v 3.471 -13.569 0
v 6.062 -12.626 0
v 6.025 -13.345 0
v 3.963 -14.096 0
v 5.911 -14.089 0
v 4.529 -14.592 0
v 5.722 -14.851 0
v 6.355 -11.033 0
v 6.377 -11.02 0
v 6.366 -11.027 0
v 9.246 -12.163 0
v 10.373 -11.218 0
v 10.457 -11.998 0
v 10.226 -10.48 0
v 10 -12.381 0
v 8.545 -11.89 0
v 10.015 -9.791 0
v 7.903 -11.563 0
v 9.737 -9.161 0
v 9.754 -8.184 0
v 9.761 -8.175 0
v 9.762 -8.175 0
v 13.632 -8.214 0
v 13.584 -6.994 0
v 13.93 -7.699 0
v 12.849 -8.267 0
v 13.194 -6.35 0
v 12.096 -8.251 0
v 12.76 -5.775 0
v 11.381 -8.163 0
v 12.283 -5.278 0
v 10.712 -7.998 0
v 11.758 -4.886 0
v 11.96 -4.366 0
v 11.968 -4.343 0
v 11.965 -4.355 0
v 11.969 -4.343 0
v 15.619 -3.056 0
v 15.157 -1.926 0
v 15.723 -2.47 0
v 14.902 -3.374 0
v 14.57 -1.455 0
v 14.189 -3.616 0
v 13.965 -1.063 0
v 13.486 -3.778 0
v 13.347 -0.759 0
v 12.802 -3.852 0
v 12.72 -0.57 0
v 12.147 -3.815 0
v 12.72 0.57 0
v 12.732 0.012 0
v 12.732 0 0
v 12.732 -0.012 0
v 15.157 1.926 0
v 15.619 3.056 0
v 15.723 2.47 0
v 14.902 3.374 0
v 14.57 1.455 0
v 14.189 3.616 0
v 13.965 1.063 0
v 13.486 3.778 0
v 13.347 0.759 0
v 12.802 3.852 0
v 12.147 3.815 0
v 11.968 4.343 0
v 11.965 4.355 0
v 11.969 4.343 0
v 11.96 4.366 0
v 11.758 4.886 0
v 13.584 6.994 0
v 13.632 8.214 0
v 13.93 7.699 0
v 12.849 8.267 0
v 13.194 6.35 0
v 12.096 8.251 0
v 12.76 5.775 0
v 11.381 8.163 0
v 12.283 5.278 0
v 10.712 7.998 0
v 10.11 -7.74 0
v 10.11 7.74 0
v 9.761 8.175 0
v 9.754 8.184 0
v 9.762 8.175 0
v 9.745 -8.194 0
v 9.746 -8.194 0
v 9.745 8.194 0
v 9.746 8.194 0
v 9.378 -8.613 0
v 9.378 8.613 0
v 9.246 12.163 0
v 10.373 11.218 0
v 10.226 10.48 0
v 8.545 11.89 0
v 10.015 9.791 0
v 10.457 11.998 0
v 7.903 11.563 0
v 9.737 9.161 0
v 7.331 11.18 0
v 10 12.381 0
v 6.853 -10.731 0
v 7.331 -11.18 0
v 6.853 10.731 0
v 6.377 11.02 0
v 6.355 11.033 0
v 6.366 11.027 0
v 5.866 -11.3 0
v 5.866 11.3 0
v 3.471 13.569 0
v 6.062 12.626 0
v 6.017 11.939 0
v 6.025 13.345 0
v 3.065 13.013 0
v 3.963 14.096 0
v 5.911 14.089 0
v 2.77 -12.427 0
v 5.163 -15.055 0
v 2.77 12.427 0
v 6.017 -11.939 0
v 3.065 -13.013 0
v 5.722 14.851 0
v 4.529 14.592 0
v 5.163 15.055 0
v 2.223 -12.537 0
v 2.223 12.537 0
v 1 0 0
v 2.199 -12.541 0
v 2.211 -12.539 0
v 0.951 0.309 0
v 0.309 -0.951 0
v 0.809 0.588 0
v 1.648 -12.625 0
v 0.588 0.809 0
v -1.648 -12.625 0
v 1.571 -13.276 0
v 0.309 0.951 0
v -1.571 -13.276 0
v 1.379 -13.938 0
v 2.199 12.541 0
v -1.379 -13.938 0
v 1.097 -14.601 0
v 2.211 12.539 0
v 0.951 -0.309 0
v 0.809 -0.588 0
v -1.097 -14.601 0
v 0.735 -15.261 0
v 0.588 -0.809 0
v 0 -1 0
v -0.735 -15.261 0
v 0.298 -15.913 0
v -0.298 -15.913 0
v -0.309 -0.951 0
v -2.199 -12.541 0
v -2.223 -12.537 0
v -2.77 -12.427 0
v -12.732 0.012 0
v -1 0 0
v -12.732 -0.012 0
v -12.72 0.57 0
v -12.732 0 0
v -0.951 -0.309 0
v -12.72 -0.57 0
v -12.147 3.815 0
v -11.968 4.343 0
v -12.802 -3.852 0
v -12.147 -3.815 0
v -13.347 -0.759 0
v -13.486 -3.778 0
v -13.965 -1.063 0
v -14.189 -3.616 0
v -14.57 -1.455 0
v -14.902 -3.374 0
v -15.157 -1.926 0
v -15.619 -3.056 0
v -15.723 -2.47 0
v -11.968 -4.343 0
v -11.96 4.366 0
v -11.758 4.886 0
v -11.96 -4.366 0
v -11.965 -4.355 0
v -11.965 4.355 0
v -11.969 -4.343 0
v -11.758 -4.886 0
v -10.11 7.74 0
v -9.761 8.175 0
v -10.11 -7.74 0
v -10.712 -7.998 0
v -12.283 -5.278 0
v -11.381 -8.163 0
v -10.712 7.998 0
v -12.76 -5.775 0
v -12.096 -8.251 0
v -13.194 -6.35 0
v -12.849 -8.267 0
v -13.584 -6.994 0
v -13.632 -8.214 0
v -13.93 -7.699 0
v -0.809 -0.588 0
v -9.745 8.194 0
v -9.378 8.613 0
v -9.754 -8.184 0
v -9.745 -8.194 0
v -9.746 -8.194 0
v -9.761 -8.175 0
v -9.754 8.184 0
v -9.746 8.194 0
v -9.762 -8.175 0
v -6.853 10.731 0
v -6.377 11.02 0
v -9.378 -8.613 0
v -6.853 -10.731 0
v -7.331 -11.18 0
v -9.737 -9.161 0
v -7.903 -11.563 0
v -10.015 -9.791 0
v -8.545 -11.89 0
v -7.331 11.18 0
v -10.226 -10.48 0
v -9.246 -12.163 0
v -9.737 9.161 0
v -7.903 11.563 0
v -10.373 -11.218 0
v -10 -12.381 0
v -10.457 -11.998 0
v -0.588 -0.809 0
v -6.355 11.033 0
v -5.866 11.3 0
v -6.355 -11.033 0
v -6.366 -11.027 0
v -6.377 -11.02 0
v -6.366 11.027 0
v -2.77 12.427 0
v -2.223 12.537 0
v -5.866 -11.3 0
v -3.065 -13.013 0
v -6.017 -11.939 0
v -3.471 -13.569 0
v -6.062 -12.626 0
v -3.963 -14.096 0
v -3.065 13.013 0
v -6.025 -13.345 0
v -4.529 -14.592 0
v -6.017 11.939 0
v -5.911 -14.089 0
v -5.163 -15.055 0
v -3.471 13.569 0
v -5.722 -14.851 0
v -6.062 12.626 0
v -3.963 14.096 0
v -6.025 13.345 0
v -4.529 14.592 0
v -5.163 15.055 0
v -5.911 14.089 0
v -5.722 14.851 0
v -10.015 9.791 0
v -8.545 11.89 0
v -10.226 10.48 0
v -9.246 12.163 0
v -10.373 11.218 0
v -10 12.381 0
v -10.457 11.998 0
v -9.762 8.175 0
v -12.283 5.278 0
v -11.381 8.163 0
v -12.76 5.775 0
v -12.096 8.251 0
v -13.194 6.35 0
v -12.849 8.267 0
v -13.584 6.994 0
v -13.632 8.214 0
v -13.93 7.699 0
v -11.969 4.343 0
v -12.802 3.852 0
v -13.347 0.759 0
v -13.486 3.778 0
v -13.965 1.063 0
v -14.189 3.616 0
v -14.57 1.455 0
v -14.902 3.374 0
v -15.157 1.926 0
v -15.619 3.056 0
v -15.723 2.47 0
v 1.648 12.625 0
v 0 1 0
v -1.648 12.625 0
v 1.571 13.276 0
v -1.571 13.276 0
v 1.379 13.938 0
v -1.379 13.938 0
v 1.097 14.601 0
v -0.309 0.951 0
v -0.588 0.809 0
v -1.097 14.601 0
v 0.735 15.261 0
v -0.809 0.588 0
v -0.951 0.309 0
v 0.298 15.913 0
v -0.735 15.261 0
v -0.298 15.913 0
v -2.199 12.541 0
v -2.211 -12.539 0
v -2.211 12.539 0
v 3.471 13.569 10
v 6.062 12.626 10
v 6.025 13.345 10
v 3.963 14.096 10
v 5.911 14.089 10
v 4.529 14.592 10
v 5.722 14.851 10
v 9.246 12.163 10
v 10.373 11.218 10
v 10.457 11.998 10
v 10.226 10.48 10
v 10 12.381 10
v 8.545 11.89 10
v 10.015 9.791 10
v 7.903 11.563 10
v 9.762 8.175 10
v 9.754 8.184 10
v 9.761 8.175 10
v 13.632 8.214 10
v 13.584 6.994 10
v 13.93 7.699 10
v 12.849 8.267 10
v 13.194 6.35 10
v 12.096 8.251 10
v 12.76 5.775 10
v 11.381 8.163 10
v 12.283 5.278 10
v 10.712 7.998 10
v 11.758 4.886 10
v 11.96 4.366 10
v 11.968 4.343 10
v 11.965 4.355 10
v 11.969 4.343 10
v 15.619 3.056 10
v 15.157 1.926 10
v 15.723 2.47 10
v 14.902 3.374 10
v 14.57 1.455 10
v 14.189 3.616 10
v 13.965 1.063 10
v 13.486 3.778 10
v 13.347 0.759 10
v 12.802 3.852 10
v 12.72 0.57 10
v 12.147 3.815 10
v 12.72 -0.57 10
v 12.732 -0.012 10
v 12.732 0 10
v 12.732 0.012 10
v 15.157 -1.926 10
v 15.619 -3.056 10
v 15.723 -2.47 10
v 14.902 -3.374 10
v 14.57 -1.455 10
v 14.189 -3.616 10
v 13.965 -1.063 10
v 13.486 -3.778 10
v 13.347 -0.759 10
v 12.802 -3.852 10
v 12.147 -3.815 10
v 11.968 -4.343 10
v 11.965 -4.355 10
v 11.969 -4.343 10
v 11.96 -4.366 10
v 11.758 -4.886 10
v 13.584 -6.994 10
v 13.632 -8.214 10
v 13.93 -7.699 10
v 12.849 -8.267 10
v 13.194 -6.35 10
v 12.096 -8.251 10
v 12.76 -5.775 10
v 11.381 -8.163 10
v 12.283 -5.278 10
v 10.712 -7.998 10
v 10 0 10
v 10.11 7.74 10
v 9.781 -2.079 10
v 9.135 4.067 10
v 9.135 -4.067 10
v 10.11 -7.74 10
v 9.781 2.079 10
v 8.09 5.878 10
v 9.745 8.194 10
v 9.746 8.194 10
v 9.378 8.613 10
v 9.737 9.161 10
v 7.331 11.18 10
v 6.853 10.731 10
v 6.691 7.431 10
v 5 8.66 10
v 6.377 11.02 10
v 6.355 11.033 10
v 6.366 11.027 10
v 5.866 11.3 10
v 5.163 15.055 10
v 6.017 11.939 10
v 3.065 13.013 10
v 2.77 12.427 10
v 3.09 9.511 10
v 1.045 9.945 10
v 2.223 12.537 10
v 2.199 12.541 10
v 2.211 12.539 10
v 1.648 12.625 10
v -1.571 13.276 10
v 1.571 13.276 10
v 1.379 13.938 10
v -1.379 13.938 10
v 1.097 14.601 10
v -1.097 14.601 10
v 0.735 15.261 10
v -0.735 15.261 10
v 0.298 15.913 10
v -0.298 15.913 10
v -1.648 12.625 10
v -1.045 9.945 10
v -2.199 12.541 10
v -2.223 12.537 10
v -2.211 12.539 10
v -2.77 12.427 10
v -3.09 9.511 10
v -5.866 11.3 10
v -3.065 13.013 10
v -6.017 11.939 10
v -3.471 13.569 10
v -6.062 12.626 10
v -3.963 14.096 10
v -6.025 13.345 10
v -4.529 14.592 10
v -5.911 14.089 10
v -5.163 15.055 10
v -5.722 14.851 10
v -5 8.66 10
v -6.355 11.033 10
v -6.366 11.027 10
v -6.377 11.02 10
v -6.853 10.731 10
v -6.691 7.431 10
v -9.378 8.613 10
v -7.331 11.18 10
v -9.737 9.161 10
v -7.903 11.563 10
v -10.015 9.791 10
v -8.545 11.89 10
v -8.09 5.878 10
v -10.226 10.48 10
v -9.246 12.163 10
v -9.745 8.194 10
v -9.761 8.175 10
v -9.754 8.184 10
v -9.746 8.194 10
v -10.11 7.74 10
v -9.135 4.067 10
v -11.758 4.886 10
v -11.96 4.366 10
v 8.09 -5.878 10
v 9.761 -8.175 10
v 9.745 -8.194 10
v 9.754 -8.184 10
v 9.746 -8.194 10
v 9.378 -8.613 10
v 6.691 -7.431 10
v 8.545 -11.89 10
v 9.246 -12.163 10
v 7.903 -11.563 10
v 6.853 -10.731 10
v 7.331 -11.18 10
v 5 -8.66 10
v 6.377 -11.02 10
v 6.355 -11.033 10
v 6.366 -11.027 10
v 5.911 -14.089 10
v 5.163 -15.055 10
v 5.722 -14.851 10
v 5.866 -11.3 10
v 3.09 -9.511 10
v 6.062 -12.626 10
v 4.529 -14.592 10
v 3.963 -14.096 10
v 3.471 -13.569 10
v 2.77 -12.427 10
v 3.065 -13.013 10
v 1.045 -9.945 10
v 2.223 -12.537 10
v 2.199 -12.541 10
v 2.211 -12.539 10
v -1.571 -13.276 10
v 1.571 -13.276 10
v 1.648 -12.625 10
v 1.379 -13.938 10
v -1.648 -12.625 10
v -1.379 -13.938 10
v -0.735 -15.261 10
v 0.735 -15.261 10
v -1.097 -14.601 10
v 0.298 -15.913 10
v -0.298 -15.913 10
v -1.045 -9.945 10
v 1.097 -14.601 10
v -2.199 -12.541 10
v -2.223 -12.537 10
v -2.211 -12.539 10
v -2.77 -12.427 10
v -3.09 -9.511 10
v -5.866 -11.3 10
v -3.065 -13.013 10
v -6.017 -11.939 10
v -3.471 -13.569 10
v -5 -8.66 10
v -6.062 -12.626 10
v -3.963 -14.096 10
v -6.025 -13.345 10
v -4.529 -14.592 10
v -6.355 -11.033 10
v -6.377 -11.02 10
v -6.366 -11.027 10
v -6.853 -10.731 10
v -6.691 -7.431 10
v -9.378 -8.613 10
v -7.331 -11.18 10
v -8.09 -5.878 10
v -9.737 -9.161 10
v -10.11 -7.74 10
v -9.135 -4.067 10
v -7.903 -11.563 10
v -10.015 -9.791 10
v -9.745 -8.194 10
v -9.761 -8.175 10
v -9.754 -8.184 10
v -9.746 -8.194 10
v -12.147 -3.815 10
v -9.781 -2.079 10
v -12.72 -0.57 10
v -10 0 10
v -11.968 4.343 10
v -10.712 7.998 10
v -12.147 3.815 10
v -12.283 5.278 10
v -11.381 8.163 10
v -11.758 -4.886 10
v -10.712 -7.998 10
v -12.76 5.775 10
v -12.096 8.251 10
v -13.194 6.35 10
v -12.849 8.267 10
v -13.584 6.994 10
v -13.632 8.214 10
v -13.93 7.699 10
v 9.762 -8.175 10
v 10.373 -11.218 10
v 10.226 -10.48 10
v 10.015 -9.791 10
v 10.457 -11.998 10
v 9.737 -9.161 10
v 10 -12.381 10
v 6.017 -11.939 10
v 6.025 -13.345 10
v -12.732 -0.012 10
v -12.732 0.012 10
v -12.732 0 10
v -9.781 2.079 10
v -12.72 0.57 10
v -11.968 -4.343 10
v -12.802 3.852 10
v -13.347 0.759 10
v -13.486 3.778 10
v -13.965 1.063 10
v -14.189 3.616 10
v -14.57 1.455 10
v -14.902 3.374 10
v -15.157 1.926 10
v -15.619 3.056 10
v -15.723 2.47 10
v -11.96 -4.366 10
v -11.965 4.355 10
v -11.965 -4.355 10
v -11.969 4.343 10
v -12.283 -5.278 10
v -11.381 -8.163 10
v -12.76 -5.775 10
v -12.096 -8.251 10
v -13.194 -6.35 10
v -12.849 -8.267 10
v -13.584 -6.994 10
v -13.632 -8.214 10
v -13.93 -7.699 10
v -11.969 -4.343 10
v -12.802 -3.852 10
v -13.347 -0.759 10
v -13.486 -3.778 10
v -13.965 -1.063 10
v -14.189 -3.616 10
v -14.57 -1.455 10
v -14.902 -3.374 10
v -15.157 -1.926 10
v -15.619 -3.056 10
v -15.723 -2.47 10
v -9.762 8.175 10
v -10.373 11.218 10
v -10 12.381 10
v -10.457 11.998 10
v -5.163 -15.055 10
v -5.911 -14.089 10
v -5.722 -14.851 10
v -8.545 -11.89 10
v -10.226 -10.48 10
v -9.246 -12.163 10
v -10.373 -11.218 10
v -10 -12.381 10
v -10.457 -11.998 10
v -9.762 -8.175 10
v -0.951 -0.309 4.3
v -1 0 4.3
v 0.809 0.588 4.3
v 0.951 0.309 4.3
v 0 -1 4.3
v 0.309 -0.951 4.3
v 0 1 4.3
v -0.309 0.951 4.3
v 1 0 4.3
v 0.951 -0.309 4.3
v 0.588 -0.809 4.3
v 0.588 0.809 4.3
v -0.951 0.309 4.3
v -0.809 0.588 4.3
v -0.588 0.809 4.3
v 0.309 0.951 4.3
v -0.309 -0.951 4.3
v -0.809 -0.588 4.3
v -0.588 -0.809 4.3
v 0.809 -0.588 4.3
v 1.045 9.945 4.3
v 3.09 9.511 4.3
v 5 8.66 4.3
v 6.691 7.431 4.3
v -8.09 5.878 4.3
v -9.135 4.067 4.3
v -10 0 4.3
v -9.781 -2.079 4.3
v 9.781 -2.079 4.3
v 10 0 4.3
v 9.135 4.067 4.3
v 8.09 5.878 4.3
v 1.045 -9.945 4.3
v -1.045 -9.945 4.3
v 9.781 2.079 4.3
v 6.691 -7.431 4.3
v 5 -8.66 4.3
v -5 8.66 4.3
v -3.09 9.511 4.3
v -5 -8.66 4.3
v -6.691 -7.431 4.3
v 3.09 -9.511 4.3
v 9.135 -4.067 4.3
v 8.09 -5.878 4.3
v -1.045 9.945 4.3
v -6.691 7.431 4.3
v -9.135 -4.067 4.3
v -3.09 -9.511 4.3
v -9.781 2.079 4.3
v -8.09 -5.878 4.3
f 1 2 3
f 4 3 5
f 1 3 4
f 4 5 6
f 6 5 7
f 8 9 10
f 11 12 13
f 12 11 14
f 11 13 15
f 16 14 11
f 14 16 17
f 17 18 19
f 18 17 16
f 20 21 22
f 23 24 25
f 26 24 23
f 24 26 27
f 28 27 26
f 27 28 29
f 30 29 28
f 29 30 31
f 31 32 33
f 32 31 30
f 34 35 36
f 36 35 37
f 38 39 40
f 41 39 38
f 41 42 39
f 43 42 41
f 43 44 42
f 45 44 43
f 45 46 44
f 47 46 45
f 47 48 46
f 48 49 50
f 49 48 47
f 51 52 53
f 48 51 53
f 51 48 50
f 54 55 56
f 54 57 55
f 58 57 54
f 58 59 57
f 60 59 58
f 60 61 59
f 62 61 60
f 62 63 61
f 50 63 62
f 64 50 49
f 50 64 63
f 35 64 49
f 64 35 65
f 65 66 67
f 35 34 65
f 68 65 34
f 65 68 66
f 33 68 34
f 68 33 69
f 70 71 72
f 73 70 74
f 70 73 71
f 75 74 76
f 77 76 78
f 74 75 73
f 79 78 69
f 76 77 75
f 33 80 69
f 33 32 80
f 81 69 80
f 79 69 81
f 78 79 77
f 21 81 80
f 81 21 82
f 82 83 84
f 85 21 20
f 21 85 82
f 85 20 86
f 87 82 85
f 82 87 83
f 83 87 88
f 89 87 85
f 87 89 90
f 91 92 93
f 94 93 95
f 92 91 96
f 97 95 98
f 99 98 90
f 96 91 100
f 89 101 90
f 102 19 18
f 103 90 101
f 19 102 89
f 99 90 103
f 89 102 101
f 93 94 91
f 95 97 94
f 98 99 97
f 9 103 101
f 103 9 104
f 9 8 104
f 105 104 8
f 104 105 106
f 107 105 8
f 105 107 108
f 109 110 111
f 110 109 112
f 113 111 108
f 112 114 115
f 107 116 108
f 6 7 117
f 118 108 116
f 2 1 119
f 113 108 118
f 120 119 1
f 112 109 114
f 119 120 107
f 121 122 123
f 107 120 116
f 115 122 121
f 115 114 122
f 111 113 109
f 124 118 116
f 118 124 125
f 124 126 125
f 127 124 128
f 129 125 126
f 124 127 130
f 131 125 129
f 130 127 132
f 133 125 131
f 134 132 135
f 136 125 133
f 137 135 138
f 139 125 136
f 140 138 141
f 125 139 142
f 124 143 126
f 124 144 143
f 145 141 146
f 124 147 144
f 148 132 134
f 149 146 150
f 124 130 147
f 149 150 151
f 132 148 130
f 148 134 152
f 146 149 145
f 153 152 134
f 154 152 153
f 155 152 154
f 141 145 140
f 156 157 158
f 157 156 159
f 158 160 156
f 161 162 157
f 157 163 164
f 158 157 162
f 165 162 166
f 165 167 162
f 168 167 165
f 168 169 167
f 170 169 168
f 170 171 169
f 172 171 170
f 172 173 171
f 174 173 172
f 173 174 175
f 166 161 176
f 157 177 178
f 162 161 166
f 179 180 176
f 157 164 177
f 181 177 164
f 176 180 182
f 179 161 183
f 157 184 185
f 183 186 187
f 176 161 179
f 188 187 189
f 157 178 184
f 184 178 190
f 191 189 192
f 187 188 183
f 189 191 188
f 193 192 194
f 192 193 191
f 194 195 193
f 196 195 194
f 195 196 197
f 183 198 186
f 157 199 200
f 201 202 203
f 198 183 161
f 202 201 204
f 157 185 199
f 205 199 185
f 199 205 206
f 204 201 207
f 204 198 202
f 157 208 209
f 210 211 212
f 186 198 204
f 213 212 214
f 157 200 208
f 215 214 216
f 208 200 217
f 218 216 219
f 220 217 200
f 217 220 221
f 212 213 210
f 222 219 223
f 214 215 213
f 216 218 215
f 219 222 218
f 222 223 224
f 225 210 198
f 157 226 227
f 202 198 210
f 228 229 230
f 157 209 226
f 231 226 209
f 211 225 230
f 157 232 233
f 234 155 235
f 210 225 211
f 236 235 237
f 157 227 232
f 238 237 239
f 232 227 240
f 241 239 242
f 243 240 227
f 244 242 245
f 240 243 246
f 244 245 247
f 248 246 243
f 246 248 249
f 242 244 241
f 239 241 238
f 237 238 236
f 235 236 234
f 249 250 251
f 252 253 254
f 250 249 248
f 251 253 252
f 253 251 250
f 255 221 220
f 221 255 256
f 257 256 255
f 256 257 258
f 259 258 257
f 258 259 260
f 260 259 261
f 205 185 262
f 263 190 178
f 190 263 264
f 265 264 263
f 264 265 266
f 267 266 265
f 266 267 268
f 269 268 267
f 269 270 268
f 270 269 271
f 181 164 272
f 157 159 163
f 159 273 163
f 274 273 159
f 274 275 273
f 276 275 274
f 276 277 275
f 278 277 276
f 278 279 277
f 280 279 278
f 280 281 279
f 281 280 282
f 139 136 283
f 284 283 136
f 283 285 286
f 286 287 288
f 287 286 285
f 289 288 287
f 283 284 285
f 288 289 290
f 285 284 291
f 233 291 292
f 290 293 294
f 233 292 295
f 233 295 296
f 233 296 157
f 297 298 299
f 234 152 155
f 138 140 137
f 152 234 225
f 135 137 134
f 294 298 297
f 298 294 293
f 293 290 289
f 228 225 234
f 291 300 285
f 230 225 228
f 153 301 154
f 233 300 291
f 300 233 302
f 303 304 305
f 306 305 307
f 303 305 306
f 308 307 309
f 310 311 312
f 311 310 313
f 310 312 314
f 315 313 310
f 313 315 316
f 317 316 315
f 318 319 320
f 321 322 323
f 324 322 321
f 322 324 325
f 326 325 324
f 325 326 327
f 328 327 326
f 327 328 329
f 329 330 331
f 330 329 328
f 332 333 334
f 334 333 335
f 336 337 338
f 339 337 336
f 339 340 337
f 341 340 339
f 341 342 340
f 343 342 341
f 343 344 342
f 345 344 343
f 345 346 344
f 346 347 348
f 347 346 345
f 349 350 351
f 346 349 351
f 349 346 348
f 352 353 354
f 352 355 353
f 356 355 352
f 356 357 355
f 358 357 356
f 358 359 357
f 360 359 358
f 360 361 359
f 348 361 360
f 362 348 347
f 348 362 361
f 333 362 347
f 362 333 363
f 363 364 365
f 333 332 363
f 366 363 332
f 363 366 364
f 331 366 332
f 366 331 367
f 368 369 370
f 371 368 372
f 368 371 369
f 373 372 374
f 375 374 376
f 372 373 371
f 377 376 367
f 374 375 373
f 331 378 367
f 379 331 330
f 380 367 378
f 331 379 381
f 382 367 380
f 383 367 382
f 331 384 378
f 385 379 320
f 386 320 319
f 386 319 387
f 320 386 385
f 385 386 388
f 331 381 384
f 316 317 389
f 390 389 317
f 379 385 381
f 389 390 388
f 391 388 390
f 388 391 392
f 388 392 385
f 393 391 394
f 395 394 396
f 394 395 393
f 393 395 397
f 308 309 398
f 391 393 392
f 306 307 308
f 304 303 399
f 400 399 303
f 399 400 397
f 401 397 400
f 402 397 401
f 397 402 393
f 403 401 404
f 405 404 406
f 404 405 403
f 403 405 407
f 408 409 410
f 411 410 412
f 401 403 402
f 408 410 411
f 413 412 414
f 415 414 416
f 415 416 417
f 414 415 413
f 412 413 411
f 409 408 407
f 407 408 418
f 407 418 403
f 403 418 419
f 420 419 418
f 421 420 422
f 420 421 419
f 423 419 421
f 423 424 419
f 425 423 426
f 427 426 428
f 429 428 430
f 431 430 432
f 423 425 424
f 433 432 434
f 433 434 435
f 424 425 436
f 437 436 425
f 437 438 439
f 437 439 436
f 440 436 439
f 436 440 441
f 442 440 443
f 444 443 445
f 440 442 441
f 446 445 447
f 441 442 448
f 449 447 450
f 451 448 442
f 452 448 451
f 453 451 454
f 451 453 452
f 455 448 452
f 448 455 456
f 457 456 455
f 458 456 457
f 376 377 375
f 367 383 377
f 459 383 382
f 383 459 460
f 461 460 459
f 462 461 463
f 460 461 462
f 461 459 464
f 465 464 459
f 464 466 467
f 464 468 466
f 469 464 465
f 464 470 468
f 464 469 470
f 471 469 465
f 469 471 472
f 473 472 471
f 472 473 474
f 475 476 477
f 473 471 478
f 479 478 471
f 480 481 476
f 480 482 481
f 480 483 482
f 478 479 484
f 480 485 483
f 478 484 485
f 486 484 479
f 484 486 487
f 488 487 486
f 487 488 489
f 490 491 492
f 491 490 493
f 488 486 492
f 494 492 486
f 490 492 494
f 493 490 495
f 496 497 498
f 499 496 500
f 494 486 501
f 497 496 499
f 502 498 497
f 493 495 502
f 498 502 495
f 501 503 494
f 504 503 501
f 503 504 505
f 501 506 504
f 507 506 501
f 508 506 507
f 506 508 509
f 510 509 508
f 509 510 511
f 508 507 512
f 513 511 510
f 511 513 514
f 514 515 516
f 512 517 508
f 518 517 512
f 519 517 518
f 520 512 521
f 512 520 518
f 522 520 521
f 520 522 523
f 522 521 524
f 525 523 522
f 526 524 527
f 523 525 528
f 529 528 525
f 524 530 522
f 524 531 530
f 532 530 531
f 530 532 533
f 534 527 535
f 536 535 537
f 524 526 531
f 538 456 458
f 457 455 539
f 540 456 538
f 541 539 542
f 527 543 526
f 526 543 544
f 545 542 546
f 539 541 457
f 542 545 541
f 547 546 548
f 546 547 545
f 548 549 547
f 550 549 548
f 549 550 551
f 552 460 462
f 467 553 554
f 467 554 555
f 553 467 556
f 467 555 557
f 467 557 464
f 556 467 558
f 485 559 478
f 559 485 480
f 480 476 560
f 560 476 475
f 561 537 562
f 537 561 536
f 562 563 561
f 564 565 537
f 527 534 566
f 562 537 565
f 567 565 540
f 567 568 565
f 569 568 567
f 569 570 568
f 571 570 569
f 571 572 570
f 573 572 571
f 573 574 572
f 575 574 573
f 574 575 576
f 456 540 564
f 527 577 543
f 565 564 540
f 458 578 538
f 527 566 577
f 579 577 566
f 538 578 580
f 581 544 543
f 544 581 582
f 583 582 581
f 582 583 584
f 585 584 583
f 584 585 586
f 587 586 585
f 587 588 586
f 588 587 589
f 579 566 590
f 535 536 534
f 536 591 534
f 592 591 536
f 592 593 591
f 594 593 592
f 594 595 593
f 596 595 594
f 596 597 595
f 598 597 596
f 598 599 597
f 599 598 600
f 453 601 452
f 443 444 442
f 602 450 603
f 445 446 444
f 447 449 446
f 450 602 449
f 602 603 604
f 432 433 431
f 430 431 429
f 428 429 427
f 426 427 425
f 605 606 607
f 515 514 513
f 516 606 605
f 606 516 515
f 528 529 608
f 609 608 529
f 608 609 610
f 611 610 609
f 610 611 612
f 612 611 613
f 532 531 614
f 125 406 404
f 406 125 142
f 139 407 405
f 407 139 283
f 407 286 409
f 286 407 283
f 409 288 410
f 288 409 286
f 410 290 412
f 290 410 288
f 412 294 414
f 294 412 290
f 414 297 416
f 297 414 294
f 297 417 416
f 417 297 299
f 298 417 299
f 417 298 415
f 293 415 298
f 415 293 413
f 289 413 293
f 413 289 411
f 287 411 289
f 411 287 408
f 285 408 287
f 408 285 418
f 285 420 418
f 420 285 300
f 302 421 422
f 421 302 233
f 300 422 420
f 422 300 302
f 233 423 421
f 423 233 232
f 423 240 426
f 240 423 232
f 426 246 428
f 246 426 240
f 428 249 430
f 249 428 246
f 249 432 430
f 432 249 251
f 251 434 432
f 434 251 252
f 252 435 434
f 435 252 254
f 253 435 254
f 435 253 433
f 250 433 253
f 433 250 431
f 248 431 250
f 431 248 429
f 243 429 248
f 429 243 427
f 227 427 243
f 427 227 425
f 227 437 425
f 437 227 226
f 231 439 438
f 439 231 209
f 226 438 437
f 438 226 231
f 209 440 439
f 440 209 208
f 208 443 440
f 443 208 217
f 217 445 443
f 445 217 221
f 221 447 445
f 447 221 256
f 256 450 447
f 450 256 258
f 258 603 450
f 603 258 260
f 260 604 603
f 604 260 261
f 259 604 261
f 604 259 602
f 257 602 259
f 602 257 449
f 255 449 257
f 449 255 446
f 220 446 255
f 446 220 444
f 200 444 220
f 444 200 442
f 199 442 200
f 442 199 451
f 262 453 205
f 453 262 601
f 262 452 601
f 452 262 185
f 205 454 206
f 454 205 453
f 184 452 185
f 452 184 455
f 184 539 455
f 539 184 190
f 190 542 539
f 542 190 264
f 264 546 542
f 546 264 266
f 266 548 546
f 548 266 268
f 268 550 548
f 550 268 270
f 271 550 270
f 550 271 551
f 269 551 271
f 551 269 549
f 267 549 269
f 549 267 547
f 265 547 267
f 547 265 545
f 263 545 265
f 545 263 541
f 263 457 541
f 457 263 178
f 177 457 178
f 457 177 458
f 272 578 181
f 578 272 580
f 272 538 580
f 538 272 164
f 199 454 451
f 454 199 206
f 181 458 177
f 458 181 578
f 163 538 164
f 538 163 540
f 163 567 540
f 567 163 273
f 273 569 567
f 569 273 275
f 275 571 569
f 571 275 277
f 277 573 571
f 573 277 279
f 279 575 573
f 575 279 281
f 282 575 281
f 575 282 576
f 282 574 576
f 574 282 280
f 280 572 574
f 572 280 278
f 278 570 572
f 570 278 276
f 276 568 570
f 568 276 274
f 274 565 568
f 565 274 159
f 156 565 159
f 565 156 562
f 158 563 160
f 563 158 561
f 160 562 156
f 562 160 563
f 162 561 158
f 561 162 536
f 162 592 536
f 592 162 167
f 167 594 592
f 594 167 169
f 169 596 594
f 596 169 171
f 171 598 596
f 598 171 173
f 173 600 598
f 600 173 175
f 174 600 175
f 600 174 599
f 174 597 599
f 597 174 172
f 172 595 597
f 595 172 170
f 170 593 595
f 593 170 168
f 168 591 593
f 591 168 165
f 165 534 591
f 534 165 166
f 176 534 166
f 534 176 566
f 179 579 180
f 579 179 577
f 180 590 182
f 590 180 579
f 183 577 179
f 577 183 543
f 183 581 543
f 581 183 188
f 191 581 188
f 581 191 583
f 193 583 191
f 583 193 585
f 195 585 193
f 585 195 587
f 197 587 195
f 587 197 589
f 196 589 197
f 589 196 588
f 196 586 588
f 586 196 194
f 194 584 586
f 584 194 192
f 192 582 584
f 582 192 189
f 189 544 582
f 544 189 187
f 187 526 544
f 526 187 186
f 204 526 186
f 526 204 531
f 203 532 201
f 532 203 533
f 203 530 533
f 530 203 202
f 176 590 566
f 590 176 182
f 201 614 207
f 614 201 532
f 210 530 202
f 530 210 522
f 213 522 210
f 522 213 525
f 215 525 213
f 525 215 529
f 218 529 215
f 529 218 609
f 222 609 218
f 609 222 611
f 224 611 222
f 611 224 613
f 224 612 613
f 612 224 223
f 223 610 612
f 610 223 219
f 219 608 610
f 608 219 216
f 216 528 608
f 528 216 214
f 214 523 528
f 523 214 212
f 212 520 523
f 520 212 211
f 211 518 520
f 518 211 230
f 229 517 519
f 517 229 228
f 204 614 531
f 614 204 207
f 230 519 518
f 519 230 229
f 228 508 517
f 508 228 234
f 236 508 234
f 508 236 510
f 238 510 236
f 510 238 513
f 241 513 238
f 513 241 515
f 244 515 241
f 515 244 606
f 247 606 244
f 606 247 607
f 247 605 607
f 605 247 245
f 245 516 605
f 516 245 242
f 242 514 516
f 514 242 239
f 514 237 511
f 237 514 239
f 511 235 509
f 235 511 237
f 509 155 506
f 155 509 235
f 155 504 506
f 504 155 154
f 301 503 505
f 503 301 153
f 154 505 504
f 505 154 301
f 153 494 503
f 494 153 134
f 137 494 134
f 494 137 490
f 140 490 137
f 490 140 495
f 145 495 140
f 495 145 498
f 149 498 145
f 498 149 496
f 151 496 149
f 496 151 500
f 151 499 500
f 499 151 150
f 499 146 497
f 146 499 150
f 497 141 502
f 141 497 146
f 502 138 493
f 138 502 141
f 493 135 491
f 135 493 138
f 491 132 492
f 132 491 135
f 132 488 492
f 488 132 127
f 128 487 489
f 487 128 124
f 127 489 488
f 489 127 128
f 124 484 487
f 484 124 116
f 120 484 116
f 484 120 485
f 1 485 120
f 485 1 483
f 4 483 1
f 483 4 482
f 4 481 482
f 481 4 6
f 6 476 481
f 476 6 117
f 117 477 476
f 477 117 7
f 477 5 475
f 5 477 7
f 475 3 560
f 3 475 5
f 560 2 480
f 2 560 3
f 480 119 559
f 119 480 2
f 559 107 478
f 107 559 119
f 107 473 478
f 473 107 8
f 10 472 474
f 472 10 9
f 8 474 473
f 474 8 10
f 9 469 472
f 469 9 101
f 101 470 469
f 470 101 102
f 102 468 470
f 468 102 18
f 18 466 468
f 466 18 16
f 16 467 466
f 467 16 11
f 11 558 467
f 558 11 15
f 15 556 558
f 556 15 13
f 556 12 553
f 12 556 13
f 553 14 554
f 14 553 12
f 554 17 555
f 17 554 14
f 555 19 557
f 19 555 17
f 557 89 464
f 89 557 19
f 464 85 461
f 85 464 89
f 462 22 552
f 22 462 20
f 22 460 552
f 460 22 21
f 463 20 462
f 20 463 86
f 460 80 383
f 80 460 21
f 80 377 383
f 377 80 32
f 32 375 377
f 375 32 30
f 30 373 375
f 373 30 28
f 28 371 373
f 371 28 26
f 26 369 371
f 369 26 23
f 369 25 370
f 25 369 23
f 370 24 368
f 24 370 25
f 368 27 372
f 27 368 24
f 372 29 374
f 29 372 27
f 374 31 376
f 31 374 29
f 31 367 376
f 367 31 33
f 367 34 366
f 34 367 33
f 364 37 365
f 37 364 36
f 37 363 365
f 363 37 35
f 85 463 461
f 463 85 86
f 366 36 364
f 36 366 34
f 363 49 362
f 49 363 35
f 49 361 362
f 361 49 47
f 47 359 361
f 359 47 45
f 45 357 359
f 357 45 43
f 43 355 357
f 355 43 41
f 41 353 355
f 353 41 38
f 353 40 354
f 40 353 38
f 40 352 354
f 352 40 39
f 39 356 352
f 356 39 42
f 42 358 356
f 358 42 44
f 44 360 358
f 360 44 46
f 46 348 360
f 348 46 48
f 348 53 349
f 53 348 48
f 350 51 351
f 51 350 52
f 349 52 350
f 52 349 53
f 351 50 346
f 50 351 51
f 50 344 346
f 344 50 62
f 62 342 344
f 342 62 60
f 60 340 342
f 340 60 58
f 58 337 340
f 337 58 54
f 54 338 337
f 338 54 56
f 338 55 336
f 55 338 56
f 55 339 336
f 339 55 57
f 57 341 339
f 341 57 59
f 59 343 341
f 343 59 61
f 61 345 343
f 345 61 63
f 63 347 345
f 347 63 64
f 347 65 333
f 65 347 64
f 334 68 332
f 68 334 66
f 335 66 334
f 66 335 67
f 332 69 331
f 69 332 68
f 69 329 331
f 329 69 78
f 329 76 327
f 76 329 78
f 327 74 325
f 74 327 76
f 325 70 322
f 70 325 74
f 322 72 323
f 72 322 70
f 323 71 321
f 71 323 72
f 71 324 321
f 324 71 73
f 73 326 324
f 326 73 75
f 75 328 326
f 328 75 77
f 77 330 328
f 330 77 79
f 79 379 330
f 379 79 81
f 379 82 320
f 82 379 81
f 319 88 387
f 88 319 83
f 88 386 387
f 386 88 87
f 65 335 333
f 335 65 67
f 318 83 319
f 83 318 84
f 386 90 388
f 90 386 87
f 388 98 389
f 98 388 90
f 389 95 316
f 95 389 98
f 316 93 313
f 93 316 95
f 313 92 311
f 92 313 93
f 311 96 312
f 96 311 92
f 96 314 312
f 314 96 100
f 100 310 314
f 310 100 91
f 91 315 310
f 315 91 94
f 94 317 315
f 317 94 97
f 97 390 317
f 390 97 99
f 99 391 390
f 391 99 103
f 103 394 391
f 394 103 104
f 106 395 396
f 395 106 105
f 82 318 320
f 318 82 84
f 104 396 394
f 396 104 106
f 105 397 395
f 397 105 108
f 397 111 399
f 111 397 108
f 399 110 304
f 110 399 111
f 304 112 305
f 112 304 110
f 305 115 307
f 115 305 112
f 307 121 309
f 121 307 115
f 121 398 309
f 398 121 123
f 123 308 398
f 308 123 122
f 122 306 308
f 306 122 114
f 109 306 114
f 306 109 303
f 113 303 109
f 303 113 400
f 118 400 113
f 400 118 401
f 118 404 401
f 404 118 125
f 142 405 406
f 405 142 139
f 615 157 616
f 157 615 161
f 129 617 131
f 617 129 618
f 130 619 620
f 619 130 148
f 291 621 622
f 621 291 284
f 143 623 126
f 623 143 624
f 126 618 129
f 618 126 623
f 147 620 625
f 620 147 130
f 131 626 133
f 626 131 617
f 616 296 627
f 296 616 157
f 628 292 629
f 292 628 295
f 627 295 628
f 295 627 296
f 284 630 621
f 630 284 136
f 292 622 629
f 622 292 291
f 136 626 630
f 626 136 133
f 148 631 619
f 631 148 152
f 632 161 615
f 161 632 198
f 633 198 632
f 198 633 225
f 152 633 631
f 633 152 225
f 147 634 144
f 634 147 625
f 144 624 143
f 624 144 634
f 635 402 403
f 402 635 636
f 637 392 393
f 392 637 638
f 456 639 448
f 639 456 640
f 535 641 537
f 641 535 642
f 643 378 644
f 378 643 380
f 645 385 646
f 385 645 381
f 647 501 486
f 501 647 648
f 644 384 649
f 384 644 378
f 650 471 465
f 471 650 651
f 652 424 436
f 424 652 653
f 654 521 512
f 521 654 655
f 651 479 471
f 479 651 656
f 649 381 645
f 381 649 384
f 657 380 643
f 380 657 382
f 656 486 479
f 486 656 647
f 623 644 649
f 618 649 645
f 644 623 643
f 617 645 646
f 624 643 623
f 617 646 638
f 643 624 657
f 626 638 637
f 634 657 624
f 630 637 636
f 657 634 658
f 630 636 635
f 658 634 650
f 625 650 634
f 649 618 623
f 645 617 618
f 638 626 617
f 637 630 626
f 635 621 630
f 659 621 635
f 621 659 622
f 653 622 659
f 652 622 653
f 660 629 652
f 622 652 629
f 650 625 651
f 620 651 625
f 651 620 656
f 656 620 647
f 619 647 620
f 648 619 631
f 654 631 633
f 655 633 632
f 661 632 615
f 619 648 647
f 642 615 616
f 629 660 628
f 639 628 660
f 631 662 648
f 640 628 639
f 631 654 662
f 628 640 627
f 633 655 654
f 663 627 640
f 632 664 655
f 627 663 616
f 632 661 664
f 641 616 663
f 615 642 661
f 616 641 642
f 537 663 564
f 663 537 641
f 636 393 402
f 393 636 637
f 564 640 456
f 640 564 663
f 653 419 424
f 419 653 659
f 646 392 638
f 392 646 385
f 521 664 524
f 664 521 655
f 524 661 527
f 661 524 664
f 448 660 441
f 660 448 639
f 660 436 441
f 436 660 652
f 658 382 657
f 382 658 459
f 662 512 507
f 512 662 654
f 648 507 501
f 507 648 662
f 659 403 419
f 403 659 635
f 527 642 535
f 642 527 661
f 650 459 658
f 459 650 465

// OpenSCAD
use <gear_generator.scad>

module servo_gear(mm_per_tooth=5, gear_teeth=18, gear_thickness=10, gear_hole_diameter=2, servo_horn_height=3.7) {
  gear_hollow_bottom = gear_thickness / 2 - servo_horn_height - 2; // Extra 2mm so screw engages properly with servo

  translate([0, 0, gear_thickness / 2]) {
    difference() {
      gear(mm_per_tooth, gear_teeth, gear_thickness, gear_hole_diameter);
      translate([0, 0, gear_hollow_bottom]) cylinder(h=servo_horn_height + 3, d=20); // Extra 2mm so screw engages properly with servo, 1mm above the top of gear
    }
  }
}

servo_gear();
